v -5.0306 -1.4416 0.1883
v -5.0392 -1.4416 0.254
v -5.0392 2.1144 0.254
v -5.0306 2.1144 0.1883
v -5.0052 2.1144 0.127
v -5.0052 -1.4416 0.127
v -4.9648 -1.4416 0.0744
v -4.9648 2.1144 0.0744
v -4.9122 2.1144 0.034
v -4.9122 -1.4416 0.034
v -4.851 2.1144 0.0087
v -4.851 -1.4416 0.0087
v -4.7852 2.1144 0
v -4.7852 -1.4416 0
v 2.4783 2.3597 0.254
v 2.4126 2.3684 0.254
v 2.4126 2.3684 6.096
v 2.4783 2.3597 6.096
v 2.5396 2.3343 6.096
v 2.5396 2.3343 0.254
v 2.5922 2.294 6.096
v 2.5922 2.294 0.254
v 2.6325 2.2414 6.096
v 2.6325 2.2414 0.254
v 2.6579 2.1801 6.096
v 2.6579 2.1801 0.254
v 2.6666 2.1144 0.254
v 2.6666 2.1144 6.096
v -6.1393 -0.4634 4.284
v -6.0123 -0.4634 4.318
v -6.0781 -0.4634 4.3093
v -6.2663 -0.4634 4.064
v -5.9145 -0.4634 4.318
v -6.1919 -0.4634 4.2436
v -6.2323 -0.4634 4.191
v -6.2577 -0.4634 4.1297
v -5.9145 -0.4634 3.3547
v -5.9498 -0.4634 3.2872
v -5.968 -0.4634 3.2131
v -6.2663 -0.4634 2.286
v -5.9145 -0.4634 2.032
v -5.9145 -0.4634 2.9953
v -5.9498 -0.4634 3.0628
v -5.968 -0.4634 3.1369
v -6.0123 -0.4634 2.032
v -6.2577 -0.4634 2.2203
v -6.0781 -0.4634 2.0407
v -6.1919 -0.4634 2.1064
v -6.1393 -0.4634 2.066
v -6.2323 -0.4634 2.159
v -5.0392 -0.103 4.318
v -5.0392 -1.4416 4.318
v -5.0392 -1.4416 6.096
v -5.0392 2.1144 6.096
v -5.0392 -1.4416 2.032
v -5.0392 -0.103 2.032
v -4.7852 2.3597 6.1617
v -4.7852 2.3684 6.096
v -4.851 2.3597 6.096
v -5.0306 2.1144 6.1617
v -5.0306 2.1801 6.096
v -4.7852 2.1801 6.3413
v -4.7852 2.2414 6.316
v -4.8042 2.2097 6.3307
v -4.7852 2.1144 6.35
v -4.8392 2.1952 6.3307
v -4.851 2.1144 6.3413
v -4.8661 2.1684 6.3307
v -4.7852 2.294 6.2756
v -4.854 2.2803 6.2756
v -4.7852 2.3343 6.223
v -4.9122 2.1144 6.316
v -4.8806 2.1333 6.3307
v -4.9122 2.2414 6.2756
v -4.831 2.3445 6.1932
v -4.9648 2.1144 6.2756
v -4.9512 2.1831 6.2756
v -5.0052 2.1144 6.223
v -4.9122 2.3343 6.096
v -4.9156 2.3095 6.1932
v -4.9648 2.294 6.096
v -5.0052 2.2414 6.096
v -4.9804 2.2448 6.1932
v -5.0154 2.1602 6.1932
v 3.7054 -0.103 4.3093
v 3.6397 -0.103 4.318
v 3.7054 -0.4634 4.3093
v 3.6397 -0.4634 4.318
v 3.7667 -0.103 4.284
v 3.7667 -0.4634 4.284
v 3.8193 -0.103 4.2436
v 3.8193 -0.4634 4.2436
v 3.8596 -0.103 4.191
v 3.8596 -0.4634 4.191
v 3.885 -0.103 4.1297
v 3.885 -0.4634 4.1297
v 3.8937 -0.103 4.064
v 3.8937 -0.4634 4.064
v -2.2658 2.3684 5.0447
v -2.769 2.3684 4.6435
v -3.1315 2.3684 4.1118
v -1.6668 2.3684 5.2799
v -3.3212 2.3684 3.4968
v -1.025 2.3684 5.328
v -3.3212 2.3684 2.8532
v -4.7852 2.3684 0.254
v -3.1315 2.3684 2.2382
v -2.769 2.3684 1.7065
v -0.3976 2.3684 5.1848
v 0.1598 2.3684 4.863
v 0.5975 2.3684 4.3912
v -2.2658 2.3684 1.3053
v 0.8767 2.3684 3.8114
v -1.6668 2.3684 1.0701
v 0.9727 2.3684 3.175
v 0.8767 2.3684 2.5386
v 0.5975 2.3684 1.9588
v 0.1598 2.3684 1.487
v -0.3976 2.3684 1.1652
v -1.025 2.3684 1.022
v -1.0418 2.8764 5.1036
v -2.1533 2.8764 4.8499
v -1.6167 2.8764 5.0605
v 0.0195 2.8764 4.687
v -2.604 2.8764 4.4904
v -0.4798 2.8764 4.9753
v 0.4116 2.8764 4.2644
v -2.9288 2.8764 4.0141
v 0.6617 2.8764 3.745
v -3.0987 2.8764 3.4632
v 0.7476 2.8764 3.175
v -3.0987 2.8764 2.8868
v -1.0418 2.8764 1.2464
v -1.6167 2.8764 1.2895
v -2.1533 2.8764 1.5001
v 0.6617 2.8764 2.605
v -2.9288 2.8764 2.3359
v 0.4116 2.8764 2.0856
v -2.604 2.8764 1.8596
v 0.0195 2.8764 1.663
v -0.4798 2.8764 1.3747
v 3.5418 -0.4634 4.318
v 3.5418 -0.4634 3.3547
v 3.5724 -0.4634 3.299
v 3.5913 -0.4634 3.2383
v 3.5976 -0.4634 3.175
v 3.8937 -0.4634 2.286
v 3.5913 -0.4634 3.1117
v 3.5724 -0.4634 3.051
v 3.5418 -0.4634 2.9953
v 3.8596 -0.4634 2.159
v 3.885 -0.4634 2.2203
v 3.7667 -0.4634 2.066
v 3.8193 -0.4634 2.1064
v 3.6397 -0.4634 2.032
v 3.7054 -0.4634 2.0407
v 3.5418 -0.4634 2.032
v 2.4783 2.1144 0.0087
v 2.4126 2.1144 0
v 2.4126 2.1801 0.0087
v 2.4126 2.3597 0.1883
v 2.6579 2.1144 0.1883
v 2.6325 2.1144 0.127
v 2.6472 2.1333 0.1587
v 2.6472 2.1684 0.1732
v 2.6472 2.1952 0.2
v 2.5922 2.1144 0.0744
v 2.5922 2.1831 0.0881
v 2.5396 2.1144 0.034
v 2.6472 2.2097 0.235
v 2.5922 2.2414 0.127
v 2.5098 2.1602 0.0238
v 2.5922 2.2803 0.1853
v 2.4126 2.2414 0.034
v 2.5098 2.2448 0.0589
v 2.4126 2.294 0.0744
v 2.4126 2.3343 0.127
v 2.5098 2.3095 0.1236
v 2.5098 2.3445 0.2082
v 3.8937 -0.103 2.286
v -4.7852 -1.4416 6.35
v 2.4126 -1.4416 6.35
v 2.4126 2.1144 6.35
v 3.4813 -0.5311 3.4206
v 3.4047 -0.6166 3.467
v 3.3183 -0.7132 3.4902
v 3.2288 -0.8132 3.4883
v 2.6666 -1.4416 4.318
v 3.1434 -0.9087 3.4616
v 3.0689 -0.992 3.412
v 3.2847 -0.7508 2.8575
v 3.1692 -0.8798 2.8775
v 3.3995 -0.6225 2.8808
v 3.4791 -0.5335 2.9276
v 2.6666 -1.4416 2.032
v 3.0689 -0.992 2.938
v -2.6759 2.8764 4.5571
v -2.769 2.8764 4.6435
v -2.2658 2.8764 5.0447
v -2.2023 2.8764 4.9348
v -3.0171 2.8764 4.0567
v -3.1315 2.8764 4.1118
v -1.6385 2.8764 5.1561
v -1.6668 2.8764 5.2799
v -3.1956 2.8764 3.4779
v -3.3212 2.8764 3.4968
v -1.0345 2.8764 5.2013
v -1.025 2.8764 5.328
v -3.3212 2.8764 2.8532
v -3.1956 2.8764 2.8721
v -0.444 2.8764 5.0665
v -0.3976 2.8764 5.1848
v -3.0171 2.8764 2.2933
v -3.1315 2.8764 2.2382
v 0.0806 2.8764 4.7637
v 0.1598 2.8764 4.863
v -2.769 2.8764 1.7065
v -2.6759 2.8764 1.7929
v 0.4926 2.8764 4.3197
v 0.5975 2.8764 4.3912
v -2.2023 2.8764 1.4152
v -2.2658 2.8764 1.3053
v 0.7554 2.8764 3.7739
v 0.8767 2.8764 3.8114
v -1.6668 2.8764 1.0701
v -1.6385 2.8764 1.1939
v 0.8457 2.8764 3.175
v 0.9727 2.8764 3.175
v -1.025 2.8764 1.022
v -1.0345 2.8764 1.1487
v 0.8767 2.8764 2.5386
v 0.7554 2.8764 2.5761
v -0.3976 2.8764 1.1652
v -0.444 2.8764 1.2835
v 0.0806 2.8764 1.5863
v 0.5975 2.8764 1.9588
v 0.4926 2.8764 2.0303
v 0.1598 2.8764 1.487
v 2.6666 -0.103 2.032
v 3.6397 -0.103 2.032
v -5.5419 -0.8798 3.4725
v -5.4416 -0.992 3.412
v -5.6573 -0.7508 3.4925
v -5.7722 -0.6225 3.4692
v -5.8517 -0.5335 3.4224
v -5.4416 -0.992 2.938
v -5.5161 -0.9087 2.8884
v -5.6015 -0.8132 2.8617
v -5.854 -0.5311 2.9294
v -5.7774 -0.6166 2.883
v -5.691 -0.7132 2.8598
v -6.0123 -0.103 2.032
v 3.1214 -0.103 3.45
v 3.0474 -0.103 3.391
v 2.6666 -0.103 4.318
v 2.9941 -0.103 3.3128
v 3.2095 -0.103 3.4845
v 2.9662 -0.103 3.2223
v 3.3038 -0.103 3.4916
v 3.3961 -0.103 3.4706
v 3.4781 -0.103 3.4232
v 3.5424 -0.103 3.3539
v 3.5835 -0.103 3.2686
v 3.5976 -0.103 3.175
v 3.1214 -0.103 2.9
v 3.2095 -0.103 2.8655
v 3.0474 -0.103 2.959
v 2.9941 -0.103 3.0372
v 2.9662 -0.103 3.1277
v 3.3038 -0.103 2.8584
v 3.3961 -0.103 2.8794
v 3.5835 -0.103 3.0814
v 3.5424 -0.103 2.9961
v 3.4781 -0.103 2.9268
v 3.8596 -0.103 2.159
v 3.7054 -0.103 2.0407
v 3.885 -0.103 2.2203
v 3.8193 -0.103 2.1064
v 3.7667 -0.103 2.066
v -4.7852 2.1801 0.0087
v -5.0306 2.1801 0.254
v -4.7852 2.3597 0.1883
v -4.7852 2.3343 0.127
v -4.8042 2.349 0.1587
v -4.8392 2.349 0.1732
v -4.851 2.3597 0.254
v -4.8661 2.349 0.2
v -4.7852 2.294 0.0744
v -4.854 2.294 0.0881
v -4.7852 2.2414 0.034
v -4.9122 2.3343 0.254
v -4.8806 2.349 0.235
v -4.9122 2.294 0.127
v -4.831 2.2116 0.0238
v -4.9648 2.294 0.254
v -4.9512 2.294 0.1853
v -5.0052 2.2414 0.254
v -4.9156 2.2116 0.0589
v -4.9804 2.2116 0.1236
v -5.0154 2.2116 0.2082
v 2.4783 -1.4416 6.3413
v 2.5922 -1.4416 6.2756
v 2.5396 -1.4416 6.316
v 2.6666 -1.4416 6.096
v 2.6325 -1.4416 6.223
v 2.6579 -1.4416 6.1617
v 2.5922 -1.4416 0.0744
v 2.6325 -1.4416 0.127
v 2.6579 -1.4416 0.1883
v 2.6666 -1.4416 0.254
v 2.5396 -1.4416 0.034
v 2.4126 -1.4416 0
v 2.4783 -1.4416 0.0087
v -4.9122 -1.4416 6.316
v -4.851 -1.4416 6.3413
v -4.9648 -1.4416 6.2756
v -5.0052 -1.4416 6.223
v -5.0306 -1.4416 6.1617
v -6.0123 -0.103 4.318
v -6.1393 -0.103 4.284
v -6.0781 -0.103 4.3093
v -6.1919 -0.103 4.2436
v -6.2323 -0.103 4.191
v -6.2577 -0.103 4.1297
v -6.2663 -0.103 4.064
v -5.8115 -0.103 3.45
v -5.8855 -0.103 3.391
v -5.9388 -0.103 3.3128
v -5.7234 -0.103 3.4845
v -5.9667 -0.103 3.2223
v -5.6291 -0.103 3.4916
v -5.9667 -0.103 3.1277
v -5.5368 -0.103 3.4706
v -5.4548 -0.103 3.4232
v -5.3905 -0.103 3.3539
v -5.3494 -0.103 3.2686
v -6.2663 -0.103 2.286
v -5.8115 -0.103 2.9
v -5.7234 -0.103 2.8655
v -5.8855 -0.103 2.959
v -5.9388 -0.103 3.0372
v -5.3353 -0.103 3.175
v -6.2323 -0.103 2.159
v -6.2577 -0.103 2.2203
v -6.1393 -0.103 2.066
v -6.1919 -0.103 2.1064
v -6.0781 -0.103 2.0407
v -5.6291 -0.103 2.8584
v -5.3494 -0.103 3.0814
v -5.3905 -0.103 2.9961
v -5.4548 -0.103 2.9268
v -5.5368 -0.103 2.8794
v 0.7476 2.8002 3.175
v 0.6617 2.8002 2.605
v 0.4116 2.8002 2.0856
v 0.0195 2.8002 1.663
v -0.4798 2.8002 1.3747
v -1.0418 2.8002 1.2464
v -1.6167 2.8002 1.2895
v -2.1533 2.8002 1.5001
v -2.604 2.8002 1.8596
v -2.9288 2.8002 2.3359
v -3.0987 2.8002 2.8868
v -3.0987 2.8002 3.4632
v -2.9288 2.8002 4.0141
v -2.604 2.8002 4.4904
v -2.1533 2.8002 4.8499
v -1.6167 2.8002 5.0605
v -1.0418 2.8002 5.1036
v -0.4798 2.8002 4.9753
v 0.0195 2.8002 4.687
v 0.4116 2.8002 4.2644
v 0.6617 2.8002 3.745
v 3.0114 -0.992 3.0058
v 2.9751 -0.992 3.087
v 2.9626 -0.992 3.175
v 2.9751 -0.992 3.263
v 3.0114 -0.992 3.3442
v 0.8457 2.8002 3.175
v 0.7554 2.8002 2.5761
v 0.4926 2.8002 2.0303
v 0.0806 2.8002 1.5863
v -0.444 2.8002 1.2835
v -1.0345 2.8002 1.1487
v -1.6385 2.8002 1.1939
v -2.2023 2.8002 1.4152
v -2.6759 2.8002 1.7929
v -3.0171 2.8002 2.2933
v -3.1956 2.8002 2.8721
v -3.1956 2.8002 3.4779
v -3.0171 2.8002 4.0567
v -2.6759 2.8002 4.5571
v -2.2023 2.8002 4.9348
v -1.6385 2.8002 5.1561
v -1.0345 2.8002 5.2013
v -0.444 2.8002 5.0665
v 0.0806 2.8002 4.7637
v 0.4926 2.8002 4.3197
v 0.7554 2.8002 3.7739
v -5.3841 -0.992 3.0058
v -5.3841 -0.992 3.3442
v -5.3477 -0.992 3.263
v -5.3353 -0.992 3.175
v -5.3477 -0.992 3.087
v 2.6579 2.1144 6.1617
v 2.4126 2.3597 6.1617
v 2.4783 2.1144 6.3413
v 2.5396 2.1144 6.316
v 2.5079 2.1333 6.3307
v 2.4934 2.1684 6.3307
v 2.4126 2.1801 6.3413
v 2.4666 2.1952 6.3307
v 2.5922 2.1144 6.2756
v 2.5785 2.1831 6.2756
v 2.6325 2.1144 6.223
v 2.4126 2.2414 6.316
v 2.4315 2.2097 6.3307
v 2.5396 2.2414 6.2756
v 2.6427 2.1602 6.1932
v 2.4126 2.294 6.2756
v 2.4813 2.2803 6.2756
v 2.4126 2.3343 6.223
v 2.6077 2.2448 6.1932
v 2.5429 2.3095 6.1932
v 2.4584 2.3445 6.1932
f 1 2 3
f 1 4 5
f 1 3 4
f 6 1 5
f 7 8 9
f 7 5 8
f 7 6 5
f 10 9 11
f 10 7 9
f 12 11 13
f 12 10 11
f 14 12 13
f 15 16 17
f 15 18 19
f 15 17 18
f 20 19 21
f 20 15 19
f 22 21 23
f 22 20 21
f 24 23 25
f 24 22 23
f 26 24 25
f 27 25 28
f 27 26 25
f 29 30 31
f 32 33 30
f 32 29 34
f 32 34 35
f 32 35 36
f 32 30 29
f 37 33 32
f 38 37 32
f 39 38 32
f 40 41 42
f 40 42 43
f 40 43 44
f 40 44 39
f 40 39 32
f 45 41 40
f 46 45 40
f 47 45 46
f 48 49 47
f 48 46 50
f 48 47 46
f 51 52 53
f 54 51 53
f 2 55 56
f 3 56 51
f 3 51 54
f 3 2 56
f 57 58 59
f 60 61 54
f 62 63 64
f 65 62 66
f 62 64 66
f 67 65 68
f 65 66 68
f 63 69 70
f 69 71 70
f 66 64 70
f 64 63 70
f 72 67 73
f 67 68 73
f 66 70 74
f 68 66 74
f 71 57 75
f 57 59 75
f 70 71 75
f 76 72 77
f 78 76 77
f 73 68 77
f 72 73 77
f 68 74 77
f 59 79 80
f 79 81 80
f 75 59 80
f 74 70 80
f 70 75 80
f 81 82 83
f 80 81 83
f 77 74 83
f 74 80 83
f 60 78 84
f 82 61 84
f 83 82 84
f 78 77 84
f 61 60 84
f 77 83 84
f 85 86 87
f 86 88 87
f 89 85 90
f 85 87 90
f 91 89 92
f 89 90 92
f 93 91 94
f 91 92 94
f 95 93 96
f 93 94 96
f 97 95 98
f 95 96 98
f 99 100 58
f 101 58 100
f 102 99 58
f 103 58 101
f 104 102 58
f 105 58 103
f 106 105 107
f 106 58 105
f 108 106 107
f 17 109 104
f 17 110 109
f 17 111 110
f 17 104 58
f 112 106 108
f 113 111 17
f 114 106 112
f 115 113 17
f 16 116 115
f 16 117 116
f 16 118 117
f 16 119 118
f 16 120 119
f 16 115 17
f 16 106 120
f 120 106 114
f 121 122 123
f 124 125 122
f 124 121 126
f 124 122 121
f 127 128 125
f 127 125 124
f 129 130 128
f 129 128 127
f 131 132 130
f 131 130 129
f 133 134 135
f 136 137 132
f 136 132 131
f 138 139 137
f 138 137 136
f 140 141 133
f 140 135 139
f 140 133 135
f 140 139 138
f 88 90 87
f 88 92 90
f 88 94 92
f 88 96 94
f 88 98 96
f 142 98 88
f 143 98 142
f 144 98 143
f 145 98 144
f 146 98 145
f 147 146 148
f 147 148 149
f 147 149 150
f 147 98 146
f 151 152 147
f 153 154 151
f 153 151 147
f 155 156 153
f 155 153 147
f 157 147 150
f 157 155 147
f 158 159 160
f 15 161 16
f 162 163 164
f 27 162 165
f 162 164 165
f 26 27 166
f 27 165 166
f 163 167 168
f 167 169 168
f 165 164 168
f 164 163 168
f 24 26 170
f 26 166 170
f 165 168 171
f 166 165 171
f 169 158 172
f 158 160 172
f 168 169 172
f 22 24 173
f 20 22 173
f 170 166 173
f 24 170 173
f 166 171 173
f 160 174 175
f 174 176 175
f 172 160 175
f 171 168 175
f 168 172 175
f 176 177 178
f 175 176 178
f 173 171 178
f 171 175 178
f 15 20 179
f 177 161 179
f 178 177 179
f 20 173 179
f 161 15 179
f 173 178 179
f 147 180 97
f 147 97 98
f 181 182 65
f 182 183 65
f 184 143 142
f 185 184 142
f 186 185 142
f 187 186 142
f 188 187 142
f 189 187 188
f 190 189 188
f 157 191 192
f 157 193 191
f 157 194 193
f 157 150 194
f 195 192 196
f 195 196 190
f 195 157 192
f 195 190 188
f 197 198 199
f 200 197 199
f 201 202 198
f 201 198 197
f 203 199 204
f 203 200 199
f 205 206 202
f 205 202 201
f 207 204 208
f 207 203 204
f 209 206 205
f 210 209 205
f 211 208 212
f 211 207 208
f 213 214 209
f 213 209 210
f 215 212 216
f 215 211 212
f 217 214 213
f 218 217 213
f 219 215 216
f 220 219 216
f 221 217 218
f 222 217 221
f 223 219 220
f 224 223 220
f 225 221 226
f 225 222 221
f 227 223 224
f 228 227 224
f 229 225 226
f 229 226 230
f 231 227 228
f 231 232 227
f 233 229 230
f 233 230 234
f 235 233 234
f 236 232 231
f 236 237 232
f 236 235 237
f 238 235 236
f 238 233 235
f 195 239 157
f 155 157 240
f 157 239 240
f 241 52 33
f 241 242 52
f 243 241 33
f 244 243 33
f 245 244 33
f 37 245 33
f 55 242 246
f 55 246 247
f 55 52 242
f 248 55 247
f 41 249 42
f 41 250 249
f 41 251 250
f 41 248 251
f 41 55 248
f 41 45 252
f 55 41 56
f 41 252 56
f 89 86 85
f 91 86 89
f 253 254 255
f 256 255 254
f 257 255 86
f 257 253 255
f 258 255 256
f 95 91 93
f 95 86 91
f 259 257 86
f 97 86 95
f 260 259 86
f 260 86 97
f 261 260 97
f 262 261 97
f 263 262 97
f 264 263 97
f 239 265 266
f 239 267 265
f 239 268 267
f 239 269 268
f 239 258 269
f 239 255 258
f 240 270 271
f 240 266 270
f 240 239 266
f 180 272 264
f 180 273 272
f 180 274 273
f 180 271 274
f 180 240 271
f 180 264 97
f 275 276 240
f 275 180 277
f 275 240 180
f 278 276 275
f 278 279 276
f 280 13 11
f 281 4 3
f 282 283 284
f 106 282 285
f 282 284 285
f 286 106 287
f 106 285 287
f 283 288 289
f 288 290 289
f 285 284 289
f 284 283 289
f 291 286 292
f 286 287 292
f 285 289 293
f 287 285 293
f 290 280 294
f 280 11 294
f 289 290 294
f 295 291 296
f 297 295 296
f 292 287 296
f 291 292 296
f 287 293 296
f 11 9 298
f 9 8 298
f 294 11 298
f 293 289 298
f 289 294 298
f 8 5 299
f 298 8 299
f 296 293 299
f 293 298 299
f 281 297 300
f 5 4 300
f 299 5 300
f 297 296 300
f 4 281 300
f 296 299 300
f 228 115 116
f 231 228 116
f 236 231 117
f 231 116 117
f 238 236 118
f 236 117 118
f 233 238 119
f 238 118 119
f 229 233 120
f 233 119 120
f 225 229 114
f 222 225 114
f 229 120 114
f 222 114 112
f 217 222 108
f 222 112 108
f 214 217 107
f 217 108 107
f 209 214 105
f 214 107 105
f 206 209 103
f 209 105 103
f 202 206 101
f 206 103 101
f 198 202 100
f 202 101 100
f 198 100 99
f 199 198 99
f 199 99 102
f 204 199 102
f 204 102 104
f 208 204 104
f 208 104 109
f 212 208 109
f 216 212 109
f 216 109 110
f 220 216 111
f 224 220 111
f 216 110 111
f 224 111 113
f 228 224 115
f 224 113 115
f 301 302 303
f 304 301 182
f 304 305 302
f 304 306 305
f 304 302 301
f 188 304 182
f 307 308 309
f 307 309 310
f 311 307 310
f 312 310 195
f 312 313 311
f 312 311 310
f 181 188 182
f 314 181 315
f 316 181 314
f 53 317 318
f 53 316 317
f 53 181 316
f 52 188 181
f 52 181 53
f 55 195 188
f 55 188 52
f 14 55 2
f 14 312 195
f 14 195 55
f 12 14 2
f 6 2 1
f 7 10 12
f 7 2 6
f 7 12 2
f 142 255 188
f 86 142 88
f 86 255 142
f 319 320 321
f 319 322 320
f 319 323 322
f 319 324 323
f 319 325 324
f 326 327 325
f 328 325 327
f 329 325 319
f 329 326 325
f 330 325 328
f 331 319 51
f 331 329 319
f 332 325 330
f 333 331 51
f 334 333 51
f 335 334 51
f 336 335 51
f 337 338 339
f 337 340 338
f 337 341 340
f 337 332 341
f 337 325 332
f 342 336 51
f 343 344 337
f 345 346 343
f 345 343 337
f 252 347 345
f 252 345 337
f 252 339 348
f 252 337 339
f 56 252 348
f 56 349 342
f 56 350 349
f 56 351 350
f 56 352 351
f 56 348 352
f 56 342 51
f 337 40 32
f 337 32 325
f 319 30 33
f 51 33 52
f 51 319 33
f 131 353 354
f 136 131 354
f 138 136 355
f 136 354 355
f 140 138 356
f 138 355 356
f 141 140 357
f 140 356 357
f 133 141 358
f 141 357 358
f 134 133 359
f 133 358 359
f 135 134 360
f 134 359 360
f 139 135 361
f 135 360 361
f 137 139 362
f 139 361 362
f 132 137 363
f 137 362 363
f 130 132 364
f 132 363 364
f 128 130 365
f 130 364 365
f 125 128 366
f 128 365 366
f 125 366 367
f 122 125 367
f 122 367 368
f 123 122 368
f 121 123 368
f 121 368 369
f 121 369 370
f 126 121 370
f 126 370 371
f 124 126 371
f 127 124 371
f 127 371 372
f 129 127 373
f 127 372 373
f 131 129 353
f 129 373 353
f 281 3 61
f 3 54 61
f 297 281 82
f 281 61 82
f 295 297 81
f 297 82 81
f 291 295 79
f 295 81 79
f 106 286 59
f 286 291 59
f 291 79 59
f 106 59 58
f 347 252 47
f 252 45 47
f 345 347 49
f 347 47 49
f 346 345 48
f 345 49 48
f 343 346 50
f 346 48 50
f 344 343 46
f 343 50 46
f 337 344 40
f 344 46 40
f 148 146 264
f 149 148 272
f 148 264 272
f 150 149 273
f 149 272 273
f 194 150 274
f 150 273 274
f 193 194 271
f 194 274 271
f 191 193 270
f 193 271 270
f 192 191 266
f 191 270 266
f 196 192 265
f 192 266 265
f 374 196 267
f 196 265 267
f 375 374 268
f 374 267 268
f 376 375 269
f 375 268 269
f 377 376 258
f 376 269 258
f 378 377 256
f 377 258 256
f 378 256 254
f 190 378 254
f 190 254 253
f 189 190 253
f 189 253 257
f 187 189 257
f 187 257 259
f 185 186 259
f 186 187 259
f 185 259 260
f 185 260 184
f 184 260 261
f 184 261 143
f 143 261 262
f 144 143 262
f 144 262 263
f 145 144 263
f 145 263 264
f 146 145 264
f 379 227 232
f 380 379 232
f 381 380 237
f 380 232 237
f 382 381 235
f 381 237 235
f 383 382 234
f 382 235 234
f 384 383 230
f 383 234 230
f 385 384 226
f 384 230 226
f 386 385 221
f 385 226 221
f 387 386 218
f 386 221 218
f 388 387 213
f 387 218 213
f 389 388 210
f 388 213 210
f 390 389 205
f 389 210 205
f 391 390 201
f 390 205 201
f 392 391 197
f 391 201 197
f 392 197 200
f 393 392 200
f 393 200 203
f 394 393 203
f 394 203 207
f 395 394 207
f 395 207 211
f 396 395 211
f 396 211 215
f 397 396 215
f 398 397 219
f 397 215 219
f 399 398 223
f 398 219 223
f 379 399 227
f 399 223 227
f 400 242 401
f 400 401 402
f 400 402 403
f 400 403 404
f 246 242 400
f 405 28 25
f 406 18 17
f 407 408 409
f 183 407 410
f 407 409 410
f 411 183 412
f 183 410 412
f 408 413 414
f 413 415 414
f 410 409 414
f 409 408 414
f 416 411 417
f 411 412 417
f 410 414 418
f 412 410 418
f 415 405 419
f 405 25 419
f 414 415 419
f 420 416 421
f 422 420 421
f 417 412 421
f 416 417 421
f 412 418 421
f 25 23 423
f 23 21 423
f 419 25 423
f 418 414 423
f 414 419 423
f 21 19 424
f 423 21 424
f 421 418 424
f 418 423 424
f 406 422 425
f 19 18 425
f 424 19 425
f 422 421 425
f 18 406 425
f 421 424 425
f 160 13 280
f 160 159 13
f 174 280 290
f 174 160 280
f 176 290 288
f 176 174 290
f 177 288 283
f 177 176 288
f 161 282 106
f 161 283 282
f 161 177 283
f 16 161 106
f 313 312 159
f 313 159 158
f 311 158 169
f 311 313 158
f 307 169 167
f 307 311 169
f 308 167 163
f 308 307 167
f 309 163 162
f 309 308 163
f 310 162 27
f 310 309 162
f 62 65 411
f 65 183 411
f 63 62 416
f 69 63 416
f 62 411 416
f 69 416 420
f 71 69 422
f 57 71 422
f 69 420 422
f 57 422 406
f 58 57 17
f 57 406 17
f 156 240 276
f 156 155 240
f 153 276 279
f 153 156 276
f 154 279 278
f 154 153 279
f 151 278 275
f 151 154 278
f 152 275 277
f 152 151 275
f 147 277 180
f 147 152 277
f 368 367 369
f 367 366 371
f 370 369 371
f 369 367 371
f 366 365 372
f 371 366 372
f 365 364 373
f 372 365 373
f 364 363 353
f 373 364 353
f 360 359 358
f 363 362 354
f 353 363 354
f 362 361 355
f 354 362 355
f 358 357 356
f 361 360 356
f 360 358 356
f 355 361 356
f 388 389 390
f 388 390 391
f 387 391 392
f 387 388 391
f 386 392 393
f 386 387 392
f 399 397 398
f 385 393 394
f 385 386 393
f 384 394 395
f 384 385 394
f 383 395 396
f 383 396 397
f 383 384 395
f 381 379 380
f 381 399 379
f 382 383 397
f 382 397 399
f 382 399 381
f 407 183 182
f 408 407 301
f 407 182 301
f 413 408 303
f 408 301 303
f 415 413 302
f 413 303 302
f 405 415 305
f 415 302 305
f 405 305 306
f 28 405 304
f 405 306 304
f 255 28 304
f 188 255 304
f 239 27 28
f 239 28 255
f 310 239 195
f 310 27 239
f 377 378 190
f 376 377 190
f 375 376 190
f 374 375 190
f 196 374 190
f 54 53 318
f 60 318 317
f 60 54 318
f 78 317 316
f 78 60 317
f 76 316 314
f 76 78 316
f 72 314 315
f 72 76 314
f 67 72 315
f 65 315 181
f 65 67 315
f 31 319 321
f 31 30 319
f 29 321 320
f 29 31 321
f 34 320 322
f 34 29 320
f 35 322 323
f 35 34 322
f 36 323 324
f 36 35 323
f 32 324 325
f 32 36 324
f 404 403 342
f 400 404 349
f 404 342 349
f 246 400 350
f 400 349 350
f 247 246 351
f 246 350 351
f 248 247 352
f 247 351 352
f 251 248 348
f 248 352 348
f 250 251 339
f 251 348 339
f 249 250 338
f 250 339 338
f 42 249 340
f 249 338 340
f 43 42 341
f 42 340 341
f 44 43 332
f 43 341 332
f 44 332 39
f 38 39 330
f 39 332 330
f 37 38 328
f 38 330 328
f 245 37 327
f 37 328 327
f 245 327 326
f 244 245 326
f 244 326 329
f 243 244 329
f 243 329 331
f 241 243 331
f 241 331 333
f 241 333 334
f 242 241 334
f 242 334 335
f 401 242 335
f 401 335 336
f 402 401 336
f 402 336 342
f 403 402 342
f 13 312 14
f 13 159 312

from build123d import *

# Parameters (mm, degrees)
BOSS_EXTRUDE1_DEPTH = 635
SKETCH2_W           = 122.70945946
SKETCH2_H           = 203.2
SKETCH2_W_2         = 122.709459459
CUT_EXTRUDE1_DEPTH  = 382
SKETCH3_R           = 31.75
CUT_EXTRUDE2_DEPTH  = 88.9
FILLET1_R           = 25.4
FILLET2_R           = 25.4
SKETCH4_R           = 215.9
BOSS_EXTRUDE2_DEPTH = 50.8
SKETCH5_R           = 203.2
CUT_EXTRUDE3_DEPTH  = 7.62
SKETCH6_R           = 193.397530636
BOSS_EXTRUDE3_DEPTH = 7.62
SCALE1_SCALE        = 0.01


with BuildPart() as part:
    # Sketch1 → Boss-Extrude1 (new body)
    with BuildSketch(Plane.XY):
        Polygon((-503.923986486, 236.837837838), (266.657094595, 236.837837838), (266.657094595, -10.297297297), (389.366554054, -10.297297297), (389.366554054, -46.337837838), (354.184121622, -46.337837838), (266.657094595, -144.162162162), (-503.923986486, -144.162162162), (-591.451013514, -46.337837838), (-626.633445946, -46.337837838), (-626.633445946, -10.297297297), (-503.923986486, -10.297297297), align=None)
    extrude(amount=BOSS_EXTRUDE1_DEPTH)

    # Sketch2 → Cut-Extrude1 (cut, through all)
    with BuildSketch(Plane(origin=(0, 236.837837838, 0), x_dir=(1, 0, 0), z_dir=(0, 1, 0))):
        with Locations((-565.278716216, -101.6)):
            Rectangle(SKETCH2_W, SKETCH2_H)
        with Locations((-565.278716216, -533.4)):
            Rectangle(SKETCH2_W, SKETCH2_H)
        with Locations((328.011824325, -533.4)):
            Rectangle(SKETCH2_W_2, SKETCH2_H)
        with Locations((328.011824325, -101.6)):
            Rectangle(SKETCH2_W_2, SKETCH2_H)
    extrude(amount=-CUT_EXTRUDE1_DEPTH, mode=Mode.SUBTRACT)

    # Sketch3 → Cut-Extrude2 (cut)
    with BuildSketch(Plane(origin=(0, -10.297297297, 0), x_dir=(1, 0, 0), z_dir=(0, 1, 0))):
        with Locations((-565.278716216, -317.5)):
            Circle(SKETCH3_R)
        with Locations((328.011824324, -317.5)):
            Circle(SKETCH3_R)
    extrude(amount=-CUT_EXTRUDE2_DEPTH, mode=Mode.SUBTRACT)

    # Fillet1
    fillet1_edges = [part.edges().sort_by_distance(p)[0] for p in [
        (389.366554054, -28.317567568, 203.2),
        (389.366554054, -28.317567568, 431.8),
        (-626.633445946, -28.317567568, 431.8),
        (-626.633445946, -28.317567568, 203.2),
    ]]
    fillet(fillet1_edges, radius=FILLET1_R)

    # Fillet2
    fillet2_edges = [part.edges().sort_by_distance(p)[0] for p in [
        (-503.923986486, 46.337837838, 0),
        (-118.633445946, 236.837837838, 0),
        (266.657094595, 46.337837838, 0),
        (-503.923986486, 236.837837838, 317.5),
        (266.657094595, 236.837837838, 317.5),
        (266.657094595, 46.337837838, 635),
        (-118.633445946, 236.837837838, 635),
        (-503.923986486, 46.337837838, 635),
    ]]
    fillet(fillet2_edges, radius=FILLET2_R)

    # Sketch4 → Boss-Extrude2 (add)
    with BuildSketch(Plane(origin=(0, 236.837837838, 0), x_dir=(1, 0, 0), z_dir=(0, 1, 0))):
        with Locations((-118.633445946, -317.5)):
            Circle(SKETCH4_R)
    extrude(amount=BOSS_EXTRUDE2_DEPTH)

    # Sketch5 → Cut-Extrude3 (cut)
    with BuildSketch(Plane(origin=(0, 287.637837838, 0), x_dir=(1, 0, 0), z_dir=(0, 1, 0))):
        with Locations((-118.633445946, -317.5)):
            Circle(SKETCH5_R)
    extrude(amount=-CUT_EXTRUDE3_DEPTH, mode=Mode.SUBTRACT)


with BuildPart() as body_2:
    # Sketch6 → Boss-Extrude3 (new body)
    with BuildSketch(Plane(origin=(0, 280.017837838, 0), x_dir=(1, 0, 0), z_dir=(0, 1, 0))):
        with Locations((-118.633445946, -317.5)):
            Circle(SKETCH6_R)
    extrude(amount=BOSS_EXTRUDE3_DEPTH)


with BuildPart() as body_2_1:
    # Scale1: scaled about (0, 0, 0)
    add(body_2.part.scale(SCALE1_SCALE))


with BuildPart() as part_1:
    # Scale1: scaled about (0, 0, 0)
    add(part.part.scale(SCALE1_SCALE))


solid = Compound([body_2_1.part, part_1.part])
